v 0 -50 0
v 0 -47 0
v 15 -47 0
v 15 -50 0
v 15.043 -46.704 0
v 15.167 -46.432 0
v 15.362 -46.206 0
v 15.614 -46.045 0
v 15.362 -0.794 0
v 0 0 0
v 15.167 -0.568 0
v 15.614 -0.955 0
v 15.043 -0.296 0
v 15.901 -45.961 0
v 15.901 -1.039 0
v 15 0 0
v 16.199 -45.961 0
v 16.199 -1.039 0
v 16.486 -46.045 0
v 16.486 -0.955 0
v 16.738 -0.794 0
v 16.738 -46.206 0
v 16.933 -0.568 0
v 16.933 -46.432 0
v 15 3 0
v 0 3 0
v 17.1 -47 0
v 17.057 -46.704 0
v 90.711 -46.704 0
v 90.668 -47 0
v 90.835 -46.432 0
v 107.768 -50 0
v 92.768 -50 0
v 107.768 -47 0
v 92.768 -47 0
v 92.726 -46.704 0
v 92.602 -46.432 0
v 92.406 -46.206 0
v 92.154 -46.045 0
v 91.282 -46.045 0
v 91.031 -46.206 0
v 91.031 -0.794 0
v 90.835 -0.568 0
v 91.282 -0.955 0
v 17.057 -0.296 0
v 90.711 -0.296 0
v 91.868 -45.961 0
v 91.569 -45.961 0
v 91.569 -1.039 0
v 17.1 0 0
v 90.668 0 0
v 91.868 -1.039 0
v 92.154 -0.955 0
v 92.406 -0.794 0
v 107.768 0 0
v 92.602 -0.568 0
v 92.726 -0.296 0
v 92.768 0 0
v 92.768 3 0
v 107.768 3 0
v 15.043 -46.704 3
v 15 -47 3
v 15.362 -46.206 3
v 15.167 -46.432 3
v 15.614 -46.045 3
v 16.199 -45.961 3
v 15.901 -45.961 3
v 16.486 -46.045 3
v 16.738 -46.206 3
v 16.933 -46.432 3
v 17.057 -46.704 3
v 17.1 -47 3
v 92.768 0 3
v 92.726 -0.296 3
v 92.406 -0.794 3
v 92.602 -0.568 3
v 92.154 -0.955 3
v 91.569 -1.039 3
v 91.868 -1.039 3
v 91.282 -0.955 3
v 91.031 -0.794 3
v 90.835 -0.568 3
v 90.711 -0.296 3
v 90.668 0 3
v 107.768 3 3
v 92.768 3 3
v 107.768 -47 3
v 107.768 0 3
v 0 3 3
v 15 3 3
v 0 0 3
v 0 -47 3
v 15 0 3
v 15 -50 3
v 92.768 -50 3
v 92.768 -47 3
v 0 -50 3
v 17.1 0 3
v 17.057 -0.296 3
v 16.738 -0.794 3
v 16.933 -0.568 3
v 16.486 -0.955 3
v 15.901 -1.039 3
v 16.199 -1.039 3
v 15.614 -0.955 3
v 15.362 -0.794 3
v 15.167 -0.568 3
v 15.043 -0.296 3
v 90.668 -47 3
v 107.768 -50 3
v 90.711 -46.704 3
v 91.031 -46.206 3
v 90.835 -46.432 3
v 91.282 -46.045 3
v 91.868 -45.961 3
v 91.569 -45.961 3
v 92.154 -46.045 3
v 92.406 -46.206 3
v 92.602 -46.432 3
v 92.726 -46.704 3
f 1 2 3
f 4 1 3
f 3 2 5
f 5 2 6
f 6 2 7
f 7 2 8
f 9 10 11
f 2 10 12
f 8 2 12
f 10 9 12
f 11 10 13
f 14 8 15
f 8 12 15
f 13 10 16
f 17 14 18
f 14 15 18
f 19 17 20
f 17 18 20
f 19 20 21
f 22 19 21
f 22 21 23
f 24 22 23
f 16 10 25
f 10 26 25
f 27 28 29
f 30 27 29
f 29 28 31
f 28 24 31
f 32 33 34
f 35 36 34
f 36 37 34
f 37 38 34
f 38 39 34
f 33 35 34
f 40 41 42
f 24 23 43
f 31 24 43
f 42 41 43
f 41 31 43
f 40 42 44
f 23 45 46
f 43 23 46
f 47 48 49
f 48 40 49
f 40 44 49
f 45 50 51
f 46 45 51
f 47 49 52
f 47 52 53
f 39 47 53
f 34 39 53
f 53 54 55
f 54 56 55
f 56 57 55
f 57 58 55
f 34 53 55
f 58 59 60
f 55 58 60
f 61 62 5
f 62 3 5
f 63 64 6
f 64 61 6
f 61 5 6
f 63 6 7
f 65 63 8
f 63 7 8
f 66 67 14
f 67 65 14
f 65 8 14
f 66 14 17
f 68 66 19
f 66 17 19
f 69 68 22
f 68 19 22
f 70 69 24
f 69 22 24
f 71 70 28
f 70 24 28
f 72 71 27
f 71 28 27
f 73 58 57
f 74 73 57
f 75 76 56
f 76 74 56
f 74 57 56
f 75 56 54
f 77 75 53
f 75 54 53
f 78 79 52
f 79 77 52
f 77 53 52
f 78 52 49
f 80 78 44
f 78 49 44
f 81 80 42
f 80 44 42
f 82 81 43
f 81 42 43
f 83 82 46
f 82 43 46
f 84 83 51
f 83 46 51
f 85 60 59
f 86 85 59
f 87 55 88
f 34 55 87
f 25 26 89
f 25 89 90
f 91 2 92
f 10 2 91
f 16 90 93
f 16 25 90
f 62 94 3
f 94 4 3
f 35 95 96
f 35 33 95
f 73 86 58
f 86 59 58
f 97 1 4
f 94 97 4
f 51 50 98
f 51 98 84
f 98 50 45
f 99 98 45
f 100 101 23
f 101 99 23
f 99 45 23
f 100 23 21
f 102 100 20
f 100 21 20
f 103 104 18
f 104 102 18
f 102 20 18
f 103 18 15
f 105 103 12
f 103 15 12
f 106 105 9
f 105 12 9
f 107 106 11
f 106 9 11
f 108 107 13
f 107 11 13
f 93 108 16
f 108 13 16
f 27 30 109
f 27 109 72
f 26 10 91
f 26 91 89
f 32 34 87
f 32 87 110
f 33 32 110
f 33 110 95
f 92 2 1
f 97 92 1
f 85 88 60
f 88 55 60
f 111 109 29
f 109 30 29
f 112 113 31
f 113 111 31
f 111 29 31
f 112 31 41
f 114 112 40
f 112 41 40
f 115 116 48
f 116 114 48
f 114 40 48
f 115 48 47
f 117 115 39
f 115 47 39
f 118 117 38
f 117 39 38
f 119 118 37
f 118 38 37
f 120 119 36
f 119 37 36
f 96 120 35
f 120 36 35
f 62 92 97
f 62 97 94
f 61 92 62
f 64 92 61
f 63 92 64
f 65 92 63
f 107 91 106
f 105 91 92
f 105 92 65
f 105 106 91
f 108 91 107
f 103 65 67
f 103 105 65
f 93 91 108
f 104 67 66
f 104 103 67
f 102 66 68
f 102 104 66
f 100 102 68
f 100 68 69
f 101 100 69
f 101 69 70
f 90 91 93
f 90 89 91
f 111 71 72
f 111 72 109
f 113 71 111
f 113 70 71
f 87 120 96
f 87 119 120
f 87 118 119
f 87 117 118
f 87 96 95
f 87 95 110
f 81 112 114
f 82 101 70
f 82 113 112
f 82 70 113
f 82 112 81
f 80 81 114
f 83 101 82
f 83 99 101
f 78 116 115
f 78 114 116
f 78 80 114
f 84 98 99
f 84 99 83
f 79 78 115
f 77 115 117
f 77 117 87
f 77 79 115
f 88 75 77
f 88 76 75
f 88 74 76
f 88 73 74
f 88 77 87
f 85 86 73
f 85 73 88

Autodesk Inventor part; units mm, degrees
ref_plane "YZ Plane" through (0, 0, 0) normal (1, 0, 0) x (0, 1, 0)
ref_plane "XZ Plane" through (0, 0, 0) normal (0, 1, 0) x (-1, 0, 0)
ref_plane "XY Plane" through (0, 0, 0) normal (0, 0, 1) x (1, 0, 0)
sketch "スケッチ1" plane through (0, 0, 0) normal (0, 0, 1) x (1, 0, 0)
  circle A0 centre (-35.9404, 22.842) radius 1.5
  circle A1 centre (5.9362, 53.5882) radius 1.5
  circle A2 centre (127.6431, 30.2622) radius 1.5
  line L0 (22.1499, 50.4807) -> (113.9448, 32.8876)
  circle A3 centre (5.9362, 53.5882) radius 4.5
  circle A4 centre (127.6431, 30.2622) radius 4.5
  circle A5 centre (-35.9404, 22.842) radius 3
  line L1 (5.0892, 49.1686) -> (11.145, 48.008)
  line L2 (11.145, 48.008) -> (22.1499, 50.4807)
  line L3 (113.9448, 32.8876) -> (122.4523, 26.6751)
  line L4 (122.4523, 26.6751) -> (126.7961, 25.8426)
  line L5 (4.4419, 57.8328) -> (15.2047, 61.622)
  line L6 (-37.785, 25.2079) -> (3.1694, 57.1371)
  line L7 (3.5126, 49.7966) -> (-34.0959, 20.4761)
  line L8 (122.0018, 41.1536) -> (130.601, 33.6535)
  circle A6 centre (80.3181, 36.2778) radius 3
  circle A7 centre (80.3181, 36.2778) radius 4.5
  line L9 (128.2106, 34.7263) -> (80.8855, 40.7419)
  circle A8 centre (80.4743, 23.124) radius 1.5
  line L10 (120.4636, 35.711) -> (121.0283, 38.6574)
  line L11 (15.1864, 58.9428) -> (14.6217, 55.9964)
  circle A9 centre (66.9779, 42.9073) radius 1.5
  circle A10 centre (66.9779, 42.9073) radius 3
  line L12 (29.9182, 56.1193) -> (29.3535, 53.1729)
  arc A11 (17.2488, 58.5475) -> (15.1864, 58.9428) centre (16.2176, 58.7451) ccw
  arc A12 (29.9182, 56.1193) -> (27.8558, 56.5146) centre (28.887, 56.3169) ccw
  arc A13 (27.2911, 53.5682) -> (29.3535, 53.1729) centre (28.3223, 53.3705) ccw
  arc A14 (14.6217, 55.9964) -> (16.6841, 55.6011) centre (15.6529, 55.7987) ccw
  line L13 (17.2488, 58.5475) -> (27.8558, 56.5146)
  line L14 (16.6841, 55.6011) -> (27.2911, 53.5682)
  arc A15 (31.8825, 55.7428) -> (27.0019, 58.7146) centre (28.887, 56.3169) ccw
  line L15 (27.0019, 58.7146) -> (18.8556, 60.2759)
  arc A16 (18.8556, 60.2759) -> (15.2047, 61.622) centre (16.2176, 58.7451) ccw
  line L16 (106.2964, 41.4808) -> (105.7317, 38.5345)
  arc A17 (108.3589, 41.0856) -> (106.2964, 41.4808) centre (107.3276, 41.2832) ccw
  arc A18 (121.0283, 38.6574) -> (118.9658, 39.0527) centre (119.997, 38.855) ccw
  arc A19 (118.4011, 36.1063) -> (120.4636, 35.711) centre (119.4323, 35.9086) ccw
  arc A20 (105.7317, 38.5345) -> (107.7942, 38.1392) centre (106.7629, 38.3368) ccw
  line L17 (31.8825, 55.7428) -> (104.3322, 41.8573)
  line L18 (108.3589, 41.0856) -> (118.9658, 39.0527)
  line L19 (107.7942, 38.1392) -> (118.4011, 36.1063)
  arc A21 (122.0018, 41.1536) -> (118.1119, 41.2527) centre (119.997, 38.855) ccw
  line L20 (118.1119, 41.2527) -> (109.9656, 42.814)
  arc A22 (109.9656, 42.814) -> (104.3322, 41.8573) centre (107.3276, 41.2832) ccw
  line L21 (30.3885, 58.9717) -> (38.2584, 54.5208)
  line L22 (16.7917, 61.7406) -> (29.4611, 59.3124)
  line L23 (120.5711, 41.8505) -> (107.9017, 44.2787)
  line L24 (106.8479, 44.2952) -> (98.5267, 42.97)
  point P0 (0, 0)
  point P1 (0, 0)
  point P2 (0, 0)
  dimension "d53" = 9
  dimension "d49" = 9
  dimension "d50" = 9
  dimension "d51" = 6
  dimension "d52" = 6
  dimension "d54" = 47.7059
  dimension "d55" = 47.7059
  dimension "d56" = 3
  dimension "d57" = 3
  dimension "d58" = 8.0769
  dimension "d59" = 8.0769
  dimension "d60" = 3
  dimension "d61" = 6
  dimension "d62" = 61.9691
  dimension "d63" = 61.9691
  dimension "d64" = 15
  dimension "d65" = 2.1
  dimension "d66" = 2
  dimension "d67" = 2
  dimension "d68" = 2
  dimension "d69" = 15
  dimension "d70" = 2.1
  dimension "d71" = 7
  dimension "d72" = 2
  dimension "d73" = 2
sketch "スケッチ2" plane through (0, 0, 0) normal (0, 0, 1) x (1, 0, 0)
  line L0 (17.1, 0) -> (90.6683, 0)
  line L1 (107.7683, 0) -> (107.7683, -47)
  line L2 (90.6683, -47) -> (17.1, -47)
  line L3 (0, -47) -> (0, 0)
  line L4 (0, 0) -> (0, 3)
  line L5 (0, 3) -> (15, 3)
  line L6 (15, 3) -> (15, 0)
  line L7 (107.7683, 0) -> (107.7683, 3)
  line L8 (107.7683, 3) -> (92.7683, 3)
  line L9 (92.7683, 3) -> (92.7683, 0)
  line L10 (107.7683, -47) -> (107.7683, -50)
  line L11 (107.7683, -50) -> (92.7683, -50)
  line L12 (92.7683, -50) -> (92.7683, -47)
  line L13 (0, -47) -> (0, -50)
  line L14 (0, -50) -> (15, -50)
  line L15 (15, -50) -> (15, -47)
  arc A0 (15, 0) -> (17.1, 0) centre (16.05, 0) ccw
  arc A1 (90.6683, 0) -> (92.7683, 0) centre (91.7183, 0) ccw
  arc A2 (92.7683, -47) -> (90.6683, -47) centre (91.7183, -47) ccw
  arc A3 (17.1, -47) -> (15, -47) centre (16.05, -47) ccw
  line L16 (15.1864, 58.9428) -> (14.6217, 55.9964) projected
  line L17 (120.4636, 35.711) -> (121.0283, 38.6574) projected
  dimension "d30" = 107.7683
  dimension "d31" = 47
  dimension "d32" = 3
  dimension "d33" = 15
  dimension "d34" = 3
  dimension "d35" = 15
  dimension "d36" = 3
  dimension "d37" = 15
  dimension "d38" = 3
  dimension "d39" = 3
  dimension "d40" = 15
  dimension "d41" = 2.1
  dimension "d42" = 2.1
  dimension "d43" = 2.1
  dimension "d44" = 2.1
  dimension "d45" = 3
  dimension "d46" = 3
  dimension "d74" = 107.7683
extrude "押し出し1" add sketch "スケッチ2" along normal blind 3
equation "\"d55\" = d54"
equation "\"d59\" = d58"
equation "\"d63\" = d62"
equation "\"d30\" = d74"
properties part number "台形サスバー板" material "ポリカーボネート、クリア"
